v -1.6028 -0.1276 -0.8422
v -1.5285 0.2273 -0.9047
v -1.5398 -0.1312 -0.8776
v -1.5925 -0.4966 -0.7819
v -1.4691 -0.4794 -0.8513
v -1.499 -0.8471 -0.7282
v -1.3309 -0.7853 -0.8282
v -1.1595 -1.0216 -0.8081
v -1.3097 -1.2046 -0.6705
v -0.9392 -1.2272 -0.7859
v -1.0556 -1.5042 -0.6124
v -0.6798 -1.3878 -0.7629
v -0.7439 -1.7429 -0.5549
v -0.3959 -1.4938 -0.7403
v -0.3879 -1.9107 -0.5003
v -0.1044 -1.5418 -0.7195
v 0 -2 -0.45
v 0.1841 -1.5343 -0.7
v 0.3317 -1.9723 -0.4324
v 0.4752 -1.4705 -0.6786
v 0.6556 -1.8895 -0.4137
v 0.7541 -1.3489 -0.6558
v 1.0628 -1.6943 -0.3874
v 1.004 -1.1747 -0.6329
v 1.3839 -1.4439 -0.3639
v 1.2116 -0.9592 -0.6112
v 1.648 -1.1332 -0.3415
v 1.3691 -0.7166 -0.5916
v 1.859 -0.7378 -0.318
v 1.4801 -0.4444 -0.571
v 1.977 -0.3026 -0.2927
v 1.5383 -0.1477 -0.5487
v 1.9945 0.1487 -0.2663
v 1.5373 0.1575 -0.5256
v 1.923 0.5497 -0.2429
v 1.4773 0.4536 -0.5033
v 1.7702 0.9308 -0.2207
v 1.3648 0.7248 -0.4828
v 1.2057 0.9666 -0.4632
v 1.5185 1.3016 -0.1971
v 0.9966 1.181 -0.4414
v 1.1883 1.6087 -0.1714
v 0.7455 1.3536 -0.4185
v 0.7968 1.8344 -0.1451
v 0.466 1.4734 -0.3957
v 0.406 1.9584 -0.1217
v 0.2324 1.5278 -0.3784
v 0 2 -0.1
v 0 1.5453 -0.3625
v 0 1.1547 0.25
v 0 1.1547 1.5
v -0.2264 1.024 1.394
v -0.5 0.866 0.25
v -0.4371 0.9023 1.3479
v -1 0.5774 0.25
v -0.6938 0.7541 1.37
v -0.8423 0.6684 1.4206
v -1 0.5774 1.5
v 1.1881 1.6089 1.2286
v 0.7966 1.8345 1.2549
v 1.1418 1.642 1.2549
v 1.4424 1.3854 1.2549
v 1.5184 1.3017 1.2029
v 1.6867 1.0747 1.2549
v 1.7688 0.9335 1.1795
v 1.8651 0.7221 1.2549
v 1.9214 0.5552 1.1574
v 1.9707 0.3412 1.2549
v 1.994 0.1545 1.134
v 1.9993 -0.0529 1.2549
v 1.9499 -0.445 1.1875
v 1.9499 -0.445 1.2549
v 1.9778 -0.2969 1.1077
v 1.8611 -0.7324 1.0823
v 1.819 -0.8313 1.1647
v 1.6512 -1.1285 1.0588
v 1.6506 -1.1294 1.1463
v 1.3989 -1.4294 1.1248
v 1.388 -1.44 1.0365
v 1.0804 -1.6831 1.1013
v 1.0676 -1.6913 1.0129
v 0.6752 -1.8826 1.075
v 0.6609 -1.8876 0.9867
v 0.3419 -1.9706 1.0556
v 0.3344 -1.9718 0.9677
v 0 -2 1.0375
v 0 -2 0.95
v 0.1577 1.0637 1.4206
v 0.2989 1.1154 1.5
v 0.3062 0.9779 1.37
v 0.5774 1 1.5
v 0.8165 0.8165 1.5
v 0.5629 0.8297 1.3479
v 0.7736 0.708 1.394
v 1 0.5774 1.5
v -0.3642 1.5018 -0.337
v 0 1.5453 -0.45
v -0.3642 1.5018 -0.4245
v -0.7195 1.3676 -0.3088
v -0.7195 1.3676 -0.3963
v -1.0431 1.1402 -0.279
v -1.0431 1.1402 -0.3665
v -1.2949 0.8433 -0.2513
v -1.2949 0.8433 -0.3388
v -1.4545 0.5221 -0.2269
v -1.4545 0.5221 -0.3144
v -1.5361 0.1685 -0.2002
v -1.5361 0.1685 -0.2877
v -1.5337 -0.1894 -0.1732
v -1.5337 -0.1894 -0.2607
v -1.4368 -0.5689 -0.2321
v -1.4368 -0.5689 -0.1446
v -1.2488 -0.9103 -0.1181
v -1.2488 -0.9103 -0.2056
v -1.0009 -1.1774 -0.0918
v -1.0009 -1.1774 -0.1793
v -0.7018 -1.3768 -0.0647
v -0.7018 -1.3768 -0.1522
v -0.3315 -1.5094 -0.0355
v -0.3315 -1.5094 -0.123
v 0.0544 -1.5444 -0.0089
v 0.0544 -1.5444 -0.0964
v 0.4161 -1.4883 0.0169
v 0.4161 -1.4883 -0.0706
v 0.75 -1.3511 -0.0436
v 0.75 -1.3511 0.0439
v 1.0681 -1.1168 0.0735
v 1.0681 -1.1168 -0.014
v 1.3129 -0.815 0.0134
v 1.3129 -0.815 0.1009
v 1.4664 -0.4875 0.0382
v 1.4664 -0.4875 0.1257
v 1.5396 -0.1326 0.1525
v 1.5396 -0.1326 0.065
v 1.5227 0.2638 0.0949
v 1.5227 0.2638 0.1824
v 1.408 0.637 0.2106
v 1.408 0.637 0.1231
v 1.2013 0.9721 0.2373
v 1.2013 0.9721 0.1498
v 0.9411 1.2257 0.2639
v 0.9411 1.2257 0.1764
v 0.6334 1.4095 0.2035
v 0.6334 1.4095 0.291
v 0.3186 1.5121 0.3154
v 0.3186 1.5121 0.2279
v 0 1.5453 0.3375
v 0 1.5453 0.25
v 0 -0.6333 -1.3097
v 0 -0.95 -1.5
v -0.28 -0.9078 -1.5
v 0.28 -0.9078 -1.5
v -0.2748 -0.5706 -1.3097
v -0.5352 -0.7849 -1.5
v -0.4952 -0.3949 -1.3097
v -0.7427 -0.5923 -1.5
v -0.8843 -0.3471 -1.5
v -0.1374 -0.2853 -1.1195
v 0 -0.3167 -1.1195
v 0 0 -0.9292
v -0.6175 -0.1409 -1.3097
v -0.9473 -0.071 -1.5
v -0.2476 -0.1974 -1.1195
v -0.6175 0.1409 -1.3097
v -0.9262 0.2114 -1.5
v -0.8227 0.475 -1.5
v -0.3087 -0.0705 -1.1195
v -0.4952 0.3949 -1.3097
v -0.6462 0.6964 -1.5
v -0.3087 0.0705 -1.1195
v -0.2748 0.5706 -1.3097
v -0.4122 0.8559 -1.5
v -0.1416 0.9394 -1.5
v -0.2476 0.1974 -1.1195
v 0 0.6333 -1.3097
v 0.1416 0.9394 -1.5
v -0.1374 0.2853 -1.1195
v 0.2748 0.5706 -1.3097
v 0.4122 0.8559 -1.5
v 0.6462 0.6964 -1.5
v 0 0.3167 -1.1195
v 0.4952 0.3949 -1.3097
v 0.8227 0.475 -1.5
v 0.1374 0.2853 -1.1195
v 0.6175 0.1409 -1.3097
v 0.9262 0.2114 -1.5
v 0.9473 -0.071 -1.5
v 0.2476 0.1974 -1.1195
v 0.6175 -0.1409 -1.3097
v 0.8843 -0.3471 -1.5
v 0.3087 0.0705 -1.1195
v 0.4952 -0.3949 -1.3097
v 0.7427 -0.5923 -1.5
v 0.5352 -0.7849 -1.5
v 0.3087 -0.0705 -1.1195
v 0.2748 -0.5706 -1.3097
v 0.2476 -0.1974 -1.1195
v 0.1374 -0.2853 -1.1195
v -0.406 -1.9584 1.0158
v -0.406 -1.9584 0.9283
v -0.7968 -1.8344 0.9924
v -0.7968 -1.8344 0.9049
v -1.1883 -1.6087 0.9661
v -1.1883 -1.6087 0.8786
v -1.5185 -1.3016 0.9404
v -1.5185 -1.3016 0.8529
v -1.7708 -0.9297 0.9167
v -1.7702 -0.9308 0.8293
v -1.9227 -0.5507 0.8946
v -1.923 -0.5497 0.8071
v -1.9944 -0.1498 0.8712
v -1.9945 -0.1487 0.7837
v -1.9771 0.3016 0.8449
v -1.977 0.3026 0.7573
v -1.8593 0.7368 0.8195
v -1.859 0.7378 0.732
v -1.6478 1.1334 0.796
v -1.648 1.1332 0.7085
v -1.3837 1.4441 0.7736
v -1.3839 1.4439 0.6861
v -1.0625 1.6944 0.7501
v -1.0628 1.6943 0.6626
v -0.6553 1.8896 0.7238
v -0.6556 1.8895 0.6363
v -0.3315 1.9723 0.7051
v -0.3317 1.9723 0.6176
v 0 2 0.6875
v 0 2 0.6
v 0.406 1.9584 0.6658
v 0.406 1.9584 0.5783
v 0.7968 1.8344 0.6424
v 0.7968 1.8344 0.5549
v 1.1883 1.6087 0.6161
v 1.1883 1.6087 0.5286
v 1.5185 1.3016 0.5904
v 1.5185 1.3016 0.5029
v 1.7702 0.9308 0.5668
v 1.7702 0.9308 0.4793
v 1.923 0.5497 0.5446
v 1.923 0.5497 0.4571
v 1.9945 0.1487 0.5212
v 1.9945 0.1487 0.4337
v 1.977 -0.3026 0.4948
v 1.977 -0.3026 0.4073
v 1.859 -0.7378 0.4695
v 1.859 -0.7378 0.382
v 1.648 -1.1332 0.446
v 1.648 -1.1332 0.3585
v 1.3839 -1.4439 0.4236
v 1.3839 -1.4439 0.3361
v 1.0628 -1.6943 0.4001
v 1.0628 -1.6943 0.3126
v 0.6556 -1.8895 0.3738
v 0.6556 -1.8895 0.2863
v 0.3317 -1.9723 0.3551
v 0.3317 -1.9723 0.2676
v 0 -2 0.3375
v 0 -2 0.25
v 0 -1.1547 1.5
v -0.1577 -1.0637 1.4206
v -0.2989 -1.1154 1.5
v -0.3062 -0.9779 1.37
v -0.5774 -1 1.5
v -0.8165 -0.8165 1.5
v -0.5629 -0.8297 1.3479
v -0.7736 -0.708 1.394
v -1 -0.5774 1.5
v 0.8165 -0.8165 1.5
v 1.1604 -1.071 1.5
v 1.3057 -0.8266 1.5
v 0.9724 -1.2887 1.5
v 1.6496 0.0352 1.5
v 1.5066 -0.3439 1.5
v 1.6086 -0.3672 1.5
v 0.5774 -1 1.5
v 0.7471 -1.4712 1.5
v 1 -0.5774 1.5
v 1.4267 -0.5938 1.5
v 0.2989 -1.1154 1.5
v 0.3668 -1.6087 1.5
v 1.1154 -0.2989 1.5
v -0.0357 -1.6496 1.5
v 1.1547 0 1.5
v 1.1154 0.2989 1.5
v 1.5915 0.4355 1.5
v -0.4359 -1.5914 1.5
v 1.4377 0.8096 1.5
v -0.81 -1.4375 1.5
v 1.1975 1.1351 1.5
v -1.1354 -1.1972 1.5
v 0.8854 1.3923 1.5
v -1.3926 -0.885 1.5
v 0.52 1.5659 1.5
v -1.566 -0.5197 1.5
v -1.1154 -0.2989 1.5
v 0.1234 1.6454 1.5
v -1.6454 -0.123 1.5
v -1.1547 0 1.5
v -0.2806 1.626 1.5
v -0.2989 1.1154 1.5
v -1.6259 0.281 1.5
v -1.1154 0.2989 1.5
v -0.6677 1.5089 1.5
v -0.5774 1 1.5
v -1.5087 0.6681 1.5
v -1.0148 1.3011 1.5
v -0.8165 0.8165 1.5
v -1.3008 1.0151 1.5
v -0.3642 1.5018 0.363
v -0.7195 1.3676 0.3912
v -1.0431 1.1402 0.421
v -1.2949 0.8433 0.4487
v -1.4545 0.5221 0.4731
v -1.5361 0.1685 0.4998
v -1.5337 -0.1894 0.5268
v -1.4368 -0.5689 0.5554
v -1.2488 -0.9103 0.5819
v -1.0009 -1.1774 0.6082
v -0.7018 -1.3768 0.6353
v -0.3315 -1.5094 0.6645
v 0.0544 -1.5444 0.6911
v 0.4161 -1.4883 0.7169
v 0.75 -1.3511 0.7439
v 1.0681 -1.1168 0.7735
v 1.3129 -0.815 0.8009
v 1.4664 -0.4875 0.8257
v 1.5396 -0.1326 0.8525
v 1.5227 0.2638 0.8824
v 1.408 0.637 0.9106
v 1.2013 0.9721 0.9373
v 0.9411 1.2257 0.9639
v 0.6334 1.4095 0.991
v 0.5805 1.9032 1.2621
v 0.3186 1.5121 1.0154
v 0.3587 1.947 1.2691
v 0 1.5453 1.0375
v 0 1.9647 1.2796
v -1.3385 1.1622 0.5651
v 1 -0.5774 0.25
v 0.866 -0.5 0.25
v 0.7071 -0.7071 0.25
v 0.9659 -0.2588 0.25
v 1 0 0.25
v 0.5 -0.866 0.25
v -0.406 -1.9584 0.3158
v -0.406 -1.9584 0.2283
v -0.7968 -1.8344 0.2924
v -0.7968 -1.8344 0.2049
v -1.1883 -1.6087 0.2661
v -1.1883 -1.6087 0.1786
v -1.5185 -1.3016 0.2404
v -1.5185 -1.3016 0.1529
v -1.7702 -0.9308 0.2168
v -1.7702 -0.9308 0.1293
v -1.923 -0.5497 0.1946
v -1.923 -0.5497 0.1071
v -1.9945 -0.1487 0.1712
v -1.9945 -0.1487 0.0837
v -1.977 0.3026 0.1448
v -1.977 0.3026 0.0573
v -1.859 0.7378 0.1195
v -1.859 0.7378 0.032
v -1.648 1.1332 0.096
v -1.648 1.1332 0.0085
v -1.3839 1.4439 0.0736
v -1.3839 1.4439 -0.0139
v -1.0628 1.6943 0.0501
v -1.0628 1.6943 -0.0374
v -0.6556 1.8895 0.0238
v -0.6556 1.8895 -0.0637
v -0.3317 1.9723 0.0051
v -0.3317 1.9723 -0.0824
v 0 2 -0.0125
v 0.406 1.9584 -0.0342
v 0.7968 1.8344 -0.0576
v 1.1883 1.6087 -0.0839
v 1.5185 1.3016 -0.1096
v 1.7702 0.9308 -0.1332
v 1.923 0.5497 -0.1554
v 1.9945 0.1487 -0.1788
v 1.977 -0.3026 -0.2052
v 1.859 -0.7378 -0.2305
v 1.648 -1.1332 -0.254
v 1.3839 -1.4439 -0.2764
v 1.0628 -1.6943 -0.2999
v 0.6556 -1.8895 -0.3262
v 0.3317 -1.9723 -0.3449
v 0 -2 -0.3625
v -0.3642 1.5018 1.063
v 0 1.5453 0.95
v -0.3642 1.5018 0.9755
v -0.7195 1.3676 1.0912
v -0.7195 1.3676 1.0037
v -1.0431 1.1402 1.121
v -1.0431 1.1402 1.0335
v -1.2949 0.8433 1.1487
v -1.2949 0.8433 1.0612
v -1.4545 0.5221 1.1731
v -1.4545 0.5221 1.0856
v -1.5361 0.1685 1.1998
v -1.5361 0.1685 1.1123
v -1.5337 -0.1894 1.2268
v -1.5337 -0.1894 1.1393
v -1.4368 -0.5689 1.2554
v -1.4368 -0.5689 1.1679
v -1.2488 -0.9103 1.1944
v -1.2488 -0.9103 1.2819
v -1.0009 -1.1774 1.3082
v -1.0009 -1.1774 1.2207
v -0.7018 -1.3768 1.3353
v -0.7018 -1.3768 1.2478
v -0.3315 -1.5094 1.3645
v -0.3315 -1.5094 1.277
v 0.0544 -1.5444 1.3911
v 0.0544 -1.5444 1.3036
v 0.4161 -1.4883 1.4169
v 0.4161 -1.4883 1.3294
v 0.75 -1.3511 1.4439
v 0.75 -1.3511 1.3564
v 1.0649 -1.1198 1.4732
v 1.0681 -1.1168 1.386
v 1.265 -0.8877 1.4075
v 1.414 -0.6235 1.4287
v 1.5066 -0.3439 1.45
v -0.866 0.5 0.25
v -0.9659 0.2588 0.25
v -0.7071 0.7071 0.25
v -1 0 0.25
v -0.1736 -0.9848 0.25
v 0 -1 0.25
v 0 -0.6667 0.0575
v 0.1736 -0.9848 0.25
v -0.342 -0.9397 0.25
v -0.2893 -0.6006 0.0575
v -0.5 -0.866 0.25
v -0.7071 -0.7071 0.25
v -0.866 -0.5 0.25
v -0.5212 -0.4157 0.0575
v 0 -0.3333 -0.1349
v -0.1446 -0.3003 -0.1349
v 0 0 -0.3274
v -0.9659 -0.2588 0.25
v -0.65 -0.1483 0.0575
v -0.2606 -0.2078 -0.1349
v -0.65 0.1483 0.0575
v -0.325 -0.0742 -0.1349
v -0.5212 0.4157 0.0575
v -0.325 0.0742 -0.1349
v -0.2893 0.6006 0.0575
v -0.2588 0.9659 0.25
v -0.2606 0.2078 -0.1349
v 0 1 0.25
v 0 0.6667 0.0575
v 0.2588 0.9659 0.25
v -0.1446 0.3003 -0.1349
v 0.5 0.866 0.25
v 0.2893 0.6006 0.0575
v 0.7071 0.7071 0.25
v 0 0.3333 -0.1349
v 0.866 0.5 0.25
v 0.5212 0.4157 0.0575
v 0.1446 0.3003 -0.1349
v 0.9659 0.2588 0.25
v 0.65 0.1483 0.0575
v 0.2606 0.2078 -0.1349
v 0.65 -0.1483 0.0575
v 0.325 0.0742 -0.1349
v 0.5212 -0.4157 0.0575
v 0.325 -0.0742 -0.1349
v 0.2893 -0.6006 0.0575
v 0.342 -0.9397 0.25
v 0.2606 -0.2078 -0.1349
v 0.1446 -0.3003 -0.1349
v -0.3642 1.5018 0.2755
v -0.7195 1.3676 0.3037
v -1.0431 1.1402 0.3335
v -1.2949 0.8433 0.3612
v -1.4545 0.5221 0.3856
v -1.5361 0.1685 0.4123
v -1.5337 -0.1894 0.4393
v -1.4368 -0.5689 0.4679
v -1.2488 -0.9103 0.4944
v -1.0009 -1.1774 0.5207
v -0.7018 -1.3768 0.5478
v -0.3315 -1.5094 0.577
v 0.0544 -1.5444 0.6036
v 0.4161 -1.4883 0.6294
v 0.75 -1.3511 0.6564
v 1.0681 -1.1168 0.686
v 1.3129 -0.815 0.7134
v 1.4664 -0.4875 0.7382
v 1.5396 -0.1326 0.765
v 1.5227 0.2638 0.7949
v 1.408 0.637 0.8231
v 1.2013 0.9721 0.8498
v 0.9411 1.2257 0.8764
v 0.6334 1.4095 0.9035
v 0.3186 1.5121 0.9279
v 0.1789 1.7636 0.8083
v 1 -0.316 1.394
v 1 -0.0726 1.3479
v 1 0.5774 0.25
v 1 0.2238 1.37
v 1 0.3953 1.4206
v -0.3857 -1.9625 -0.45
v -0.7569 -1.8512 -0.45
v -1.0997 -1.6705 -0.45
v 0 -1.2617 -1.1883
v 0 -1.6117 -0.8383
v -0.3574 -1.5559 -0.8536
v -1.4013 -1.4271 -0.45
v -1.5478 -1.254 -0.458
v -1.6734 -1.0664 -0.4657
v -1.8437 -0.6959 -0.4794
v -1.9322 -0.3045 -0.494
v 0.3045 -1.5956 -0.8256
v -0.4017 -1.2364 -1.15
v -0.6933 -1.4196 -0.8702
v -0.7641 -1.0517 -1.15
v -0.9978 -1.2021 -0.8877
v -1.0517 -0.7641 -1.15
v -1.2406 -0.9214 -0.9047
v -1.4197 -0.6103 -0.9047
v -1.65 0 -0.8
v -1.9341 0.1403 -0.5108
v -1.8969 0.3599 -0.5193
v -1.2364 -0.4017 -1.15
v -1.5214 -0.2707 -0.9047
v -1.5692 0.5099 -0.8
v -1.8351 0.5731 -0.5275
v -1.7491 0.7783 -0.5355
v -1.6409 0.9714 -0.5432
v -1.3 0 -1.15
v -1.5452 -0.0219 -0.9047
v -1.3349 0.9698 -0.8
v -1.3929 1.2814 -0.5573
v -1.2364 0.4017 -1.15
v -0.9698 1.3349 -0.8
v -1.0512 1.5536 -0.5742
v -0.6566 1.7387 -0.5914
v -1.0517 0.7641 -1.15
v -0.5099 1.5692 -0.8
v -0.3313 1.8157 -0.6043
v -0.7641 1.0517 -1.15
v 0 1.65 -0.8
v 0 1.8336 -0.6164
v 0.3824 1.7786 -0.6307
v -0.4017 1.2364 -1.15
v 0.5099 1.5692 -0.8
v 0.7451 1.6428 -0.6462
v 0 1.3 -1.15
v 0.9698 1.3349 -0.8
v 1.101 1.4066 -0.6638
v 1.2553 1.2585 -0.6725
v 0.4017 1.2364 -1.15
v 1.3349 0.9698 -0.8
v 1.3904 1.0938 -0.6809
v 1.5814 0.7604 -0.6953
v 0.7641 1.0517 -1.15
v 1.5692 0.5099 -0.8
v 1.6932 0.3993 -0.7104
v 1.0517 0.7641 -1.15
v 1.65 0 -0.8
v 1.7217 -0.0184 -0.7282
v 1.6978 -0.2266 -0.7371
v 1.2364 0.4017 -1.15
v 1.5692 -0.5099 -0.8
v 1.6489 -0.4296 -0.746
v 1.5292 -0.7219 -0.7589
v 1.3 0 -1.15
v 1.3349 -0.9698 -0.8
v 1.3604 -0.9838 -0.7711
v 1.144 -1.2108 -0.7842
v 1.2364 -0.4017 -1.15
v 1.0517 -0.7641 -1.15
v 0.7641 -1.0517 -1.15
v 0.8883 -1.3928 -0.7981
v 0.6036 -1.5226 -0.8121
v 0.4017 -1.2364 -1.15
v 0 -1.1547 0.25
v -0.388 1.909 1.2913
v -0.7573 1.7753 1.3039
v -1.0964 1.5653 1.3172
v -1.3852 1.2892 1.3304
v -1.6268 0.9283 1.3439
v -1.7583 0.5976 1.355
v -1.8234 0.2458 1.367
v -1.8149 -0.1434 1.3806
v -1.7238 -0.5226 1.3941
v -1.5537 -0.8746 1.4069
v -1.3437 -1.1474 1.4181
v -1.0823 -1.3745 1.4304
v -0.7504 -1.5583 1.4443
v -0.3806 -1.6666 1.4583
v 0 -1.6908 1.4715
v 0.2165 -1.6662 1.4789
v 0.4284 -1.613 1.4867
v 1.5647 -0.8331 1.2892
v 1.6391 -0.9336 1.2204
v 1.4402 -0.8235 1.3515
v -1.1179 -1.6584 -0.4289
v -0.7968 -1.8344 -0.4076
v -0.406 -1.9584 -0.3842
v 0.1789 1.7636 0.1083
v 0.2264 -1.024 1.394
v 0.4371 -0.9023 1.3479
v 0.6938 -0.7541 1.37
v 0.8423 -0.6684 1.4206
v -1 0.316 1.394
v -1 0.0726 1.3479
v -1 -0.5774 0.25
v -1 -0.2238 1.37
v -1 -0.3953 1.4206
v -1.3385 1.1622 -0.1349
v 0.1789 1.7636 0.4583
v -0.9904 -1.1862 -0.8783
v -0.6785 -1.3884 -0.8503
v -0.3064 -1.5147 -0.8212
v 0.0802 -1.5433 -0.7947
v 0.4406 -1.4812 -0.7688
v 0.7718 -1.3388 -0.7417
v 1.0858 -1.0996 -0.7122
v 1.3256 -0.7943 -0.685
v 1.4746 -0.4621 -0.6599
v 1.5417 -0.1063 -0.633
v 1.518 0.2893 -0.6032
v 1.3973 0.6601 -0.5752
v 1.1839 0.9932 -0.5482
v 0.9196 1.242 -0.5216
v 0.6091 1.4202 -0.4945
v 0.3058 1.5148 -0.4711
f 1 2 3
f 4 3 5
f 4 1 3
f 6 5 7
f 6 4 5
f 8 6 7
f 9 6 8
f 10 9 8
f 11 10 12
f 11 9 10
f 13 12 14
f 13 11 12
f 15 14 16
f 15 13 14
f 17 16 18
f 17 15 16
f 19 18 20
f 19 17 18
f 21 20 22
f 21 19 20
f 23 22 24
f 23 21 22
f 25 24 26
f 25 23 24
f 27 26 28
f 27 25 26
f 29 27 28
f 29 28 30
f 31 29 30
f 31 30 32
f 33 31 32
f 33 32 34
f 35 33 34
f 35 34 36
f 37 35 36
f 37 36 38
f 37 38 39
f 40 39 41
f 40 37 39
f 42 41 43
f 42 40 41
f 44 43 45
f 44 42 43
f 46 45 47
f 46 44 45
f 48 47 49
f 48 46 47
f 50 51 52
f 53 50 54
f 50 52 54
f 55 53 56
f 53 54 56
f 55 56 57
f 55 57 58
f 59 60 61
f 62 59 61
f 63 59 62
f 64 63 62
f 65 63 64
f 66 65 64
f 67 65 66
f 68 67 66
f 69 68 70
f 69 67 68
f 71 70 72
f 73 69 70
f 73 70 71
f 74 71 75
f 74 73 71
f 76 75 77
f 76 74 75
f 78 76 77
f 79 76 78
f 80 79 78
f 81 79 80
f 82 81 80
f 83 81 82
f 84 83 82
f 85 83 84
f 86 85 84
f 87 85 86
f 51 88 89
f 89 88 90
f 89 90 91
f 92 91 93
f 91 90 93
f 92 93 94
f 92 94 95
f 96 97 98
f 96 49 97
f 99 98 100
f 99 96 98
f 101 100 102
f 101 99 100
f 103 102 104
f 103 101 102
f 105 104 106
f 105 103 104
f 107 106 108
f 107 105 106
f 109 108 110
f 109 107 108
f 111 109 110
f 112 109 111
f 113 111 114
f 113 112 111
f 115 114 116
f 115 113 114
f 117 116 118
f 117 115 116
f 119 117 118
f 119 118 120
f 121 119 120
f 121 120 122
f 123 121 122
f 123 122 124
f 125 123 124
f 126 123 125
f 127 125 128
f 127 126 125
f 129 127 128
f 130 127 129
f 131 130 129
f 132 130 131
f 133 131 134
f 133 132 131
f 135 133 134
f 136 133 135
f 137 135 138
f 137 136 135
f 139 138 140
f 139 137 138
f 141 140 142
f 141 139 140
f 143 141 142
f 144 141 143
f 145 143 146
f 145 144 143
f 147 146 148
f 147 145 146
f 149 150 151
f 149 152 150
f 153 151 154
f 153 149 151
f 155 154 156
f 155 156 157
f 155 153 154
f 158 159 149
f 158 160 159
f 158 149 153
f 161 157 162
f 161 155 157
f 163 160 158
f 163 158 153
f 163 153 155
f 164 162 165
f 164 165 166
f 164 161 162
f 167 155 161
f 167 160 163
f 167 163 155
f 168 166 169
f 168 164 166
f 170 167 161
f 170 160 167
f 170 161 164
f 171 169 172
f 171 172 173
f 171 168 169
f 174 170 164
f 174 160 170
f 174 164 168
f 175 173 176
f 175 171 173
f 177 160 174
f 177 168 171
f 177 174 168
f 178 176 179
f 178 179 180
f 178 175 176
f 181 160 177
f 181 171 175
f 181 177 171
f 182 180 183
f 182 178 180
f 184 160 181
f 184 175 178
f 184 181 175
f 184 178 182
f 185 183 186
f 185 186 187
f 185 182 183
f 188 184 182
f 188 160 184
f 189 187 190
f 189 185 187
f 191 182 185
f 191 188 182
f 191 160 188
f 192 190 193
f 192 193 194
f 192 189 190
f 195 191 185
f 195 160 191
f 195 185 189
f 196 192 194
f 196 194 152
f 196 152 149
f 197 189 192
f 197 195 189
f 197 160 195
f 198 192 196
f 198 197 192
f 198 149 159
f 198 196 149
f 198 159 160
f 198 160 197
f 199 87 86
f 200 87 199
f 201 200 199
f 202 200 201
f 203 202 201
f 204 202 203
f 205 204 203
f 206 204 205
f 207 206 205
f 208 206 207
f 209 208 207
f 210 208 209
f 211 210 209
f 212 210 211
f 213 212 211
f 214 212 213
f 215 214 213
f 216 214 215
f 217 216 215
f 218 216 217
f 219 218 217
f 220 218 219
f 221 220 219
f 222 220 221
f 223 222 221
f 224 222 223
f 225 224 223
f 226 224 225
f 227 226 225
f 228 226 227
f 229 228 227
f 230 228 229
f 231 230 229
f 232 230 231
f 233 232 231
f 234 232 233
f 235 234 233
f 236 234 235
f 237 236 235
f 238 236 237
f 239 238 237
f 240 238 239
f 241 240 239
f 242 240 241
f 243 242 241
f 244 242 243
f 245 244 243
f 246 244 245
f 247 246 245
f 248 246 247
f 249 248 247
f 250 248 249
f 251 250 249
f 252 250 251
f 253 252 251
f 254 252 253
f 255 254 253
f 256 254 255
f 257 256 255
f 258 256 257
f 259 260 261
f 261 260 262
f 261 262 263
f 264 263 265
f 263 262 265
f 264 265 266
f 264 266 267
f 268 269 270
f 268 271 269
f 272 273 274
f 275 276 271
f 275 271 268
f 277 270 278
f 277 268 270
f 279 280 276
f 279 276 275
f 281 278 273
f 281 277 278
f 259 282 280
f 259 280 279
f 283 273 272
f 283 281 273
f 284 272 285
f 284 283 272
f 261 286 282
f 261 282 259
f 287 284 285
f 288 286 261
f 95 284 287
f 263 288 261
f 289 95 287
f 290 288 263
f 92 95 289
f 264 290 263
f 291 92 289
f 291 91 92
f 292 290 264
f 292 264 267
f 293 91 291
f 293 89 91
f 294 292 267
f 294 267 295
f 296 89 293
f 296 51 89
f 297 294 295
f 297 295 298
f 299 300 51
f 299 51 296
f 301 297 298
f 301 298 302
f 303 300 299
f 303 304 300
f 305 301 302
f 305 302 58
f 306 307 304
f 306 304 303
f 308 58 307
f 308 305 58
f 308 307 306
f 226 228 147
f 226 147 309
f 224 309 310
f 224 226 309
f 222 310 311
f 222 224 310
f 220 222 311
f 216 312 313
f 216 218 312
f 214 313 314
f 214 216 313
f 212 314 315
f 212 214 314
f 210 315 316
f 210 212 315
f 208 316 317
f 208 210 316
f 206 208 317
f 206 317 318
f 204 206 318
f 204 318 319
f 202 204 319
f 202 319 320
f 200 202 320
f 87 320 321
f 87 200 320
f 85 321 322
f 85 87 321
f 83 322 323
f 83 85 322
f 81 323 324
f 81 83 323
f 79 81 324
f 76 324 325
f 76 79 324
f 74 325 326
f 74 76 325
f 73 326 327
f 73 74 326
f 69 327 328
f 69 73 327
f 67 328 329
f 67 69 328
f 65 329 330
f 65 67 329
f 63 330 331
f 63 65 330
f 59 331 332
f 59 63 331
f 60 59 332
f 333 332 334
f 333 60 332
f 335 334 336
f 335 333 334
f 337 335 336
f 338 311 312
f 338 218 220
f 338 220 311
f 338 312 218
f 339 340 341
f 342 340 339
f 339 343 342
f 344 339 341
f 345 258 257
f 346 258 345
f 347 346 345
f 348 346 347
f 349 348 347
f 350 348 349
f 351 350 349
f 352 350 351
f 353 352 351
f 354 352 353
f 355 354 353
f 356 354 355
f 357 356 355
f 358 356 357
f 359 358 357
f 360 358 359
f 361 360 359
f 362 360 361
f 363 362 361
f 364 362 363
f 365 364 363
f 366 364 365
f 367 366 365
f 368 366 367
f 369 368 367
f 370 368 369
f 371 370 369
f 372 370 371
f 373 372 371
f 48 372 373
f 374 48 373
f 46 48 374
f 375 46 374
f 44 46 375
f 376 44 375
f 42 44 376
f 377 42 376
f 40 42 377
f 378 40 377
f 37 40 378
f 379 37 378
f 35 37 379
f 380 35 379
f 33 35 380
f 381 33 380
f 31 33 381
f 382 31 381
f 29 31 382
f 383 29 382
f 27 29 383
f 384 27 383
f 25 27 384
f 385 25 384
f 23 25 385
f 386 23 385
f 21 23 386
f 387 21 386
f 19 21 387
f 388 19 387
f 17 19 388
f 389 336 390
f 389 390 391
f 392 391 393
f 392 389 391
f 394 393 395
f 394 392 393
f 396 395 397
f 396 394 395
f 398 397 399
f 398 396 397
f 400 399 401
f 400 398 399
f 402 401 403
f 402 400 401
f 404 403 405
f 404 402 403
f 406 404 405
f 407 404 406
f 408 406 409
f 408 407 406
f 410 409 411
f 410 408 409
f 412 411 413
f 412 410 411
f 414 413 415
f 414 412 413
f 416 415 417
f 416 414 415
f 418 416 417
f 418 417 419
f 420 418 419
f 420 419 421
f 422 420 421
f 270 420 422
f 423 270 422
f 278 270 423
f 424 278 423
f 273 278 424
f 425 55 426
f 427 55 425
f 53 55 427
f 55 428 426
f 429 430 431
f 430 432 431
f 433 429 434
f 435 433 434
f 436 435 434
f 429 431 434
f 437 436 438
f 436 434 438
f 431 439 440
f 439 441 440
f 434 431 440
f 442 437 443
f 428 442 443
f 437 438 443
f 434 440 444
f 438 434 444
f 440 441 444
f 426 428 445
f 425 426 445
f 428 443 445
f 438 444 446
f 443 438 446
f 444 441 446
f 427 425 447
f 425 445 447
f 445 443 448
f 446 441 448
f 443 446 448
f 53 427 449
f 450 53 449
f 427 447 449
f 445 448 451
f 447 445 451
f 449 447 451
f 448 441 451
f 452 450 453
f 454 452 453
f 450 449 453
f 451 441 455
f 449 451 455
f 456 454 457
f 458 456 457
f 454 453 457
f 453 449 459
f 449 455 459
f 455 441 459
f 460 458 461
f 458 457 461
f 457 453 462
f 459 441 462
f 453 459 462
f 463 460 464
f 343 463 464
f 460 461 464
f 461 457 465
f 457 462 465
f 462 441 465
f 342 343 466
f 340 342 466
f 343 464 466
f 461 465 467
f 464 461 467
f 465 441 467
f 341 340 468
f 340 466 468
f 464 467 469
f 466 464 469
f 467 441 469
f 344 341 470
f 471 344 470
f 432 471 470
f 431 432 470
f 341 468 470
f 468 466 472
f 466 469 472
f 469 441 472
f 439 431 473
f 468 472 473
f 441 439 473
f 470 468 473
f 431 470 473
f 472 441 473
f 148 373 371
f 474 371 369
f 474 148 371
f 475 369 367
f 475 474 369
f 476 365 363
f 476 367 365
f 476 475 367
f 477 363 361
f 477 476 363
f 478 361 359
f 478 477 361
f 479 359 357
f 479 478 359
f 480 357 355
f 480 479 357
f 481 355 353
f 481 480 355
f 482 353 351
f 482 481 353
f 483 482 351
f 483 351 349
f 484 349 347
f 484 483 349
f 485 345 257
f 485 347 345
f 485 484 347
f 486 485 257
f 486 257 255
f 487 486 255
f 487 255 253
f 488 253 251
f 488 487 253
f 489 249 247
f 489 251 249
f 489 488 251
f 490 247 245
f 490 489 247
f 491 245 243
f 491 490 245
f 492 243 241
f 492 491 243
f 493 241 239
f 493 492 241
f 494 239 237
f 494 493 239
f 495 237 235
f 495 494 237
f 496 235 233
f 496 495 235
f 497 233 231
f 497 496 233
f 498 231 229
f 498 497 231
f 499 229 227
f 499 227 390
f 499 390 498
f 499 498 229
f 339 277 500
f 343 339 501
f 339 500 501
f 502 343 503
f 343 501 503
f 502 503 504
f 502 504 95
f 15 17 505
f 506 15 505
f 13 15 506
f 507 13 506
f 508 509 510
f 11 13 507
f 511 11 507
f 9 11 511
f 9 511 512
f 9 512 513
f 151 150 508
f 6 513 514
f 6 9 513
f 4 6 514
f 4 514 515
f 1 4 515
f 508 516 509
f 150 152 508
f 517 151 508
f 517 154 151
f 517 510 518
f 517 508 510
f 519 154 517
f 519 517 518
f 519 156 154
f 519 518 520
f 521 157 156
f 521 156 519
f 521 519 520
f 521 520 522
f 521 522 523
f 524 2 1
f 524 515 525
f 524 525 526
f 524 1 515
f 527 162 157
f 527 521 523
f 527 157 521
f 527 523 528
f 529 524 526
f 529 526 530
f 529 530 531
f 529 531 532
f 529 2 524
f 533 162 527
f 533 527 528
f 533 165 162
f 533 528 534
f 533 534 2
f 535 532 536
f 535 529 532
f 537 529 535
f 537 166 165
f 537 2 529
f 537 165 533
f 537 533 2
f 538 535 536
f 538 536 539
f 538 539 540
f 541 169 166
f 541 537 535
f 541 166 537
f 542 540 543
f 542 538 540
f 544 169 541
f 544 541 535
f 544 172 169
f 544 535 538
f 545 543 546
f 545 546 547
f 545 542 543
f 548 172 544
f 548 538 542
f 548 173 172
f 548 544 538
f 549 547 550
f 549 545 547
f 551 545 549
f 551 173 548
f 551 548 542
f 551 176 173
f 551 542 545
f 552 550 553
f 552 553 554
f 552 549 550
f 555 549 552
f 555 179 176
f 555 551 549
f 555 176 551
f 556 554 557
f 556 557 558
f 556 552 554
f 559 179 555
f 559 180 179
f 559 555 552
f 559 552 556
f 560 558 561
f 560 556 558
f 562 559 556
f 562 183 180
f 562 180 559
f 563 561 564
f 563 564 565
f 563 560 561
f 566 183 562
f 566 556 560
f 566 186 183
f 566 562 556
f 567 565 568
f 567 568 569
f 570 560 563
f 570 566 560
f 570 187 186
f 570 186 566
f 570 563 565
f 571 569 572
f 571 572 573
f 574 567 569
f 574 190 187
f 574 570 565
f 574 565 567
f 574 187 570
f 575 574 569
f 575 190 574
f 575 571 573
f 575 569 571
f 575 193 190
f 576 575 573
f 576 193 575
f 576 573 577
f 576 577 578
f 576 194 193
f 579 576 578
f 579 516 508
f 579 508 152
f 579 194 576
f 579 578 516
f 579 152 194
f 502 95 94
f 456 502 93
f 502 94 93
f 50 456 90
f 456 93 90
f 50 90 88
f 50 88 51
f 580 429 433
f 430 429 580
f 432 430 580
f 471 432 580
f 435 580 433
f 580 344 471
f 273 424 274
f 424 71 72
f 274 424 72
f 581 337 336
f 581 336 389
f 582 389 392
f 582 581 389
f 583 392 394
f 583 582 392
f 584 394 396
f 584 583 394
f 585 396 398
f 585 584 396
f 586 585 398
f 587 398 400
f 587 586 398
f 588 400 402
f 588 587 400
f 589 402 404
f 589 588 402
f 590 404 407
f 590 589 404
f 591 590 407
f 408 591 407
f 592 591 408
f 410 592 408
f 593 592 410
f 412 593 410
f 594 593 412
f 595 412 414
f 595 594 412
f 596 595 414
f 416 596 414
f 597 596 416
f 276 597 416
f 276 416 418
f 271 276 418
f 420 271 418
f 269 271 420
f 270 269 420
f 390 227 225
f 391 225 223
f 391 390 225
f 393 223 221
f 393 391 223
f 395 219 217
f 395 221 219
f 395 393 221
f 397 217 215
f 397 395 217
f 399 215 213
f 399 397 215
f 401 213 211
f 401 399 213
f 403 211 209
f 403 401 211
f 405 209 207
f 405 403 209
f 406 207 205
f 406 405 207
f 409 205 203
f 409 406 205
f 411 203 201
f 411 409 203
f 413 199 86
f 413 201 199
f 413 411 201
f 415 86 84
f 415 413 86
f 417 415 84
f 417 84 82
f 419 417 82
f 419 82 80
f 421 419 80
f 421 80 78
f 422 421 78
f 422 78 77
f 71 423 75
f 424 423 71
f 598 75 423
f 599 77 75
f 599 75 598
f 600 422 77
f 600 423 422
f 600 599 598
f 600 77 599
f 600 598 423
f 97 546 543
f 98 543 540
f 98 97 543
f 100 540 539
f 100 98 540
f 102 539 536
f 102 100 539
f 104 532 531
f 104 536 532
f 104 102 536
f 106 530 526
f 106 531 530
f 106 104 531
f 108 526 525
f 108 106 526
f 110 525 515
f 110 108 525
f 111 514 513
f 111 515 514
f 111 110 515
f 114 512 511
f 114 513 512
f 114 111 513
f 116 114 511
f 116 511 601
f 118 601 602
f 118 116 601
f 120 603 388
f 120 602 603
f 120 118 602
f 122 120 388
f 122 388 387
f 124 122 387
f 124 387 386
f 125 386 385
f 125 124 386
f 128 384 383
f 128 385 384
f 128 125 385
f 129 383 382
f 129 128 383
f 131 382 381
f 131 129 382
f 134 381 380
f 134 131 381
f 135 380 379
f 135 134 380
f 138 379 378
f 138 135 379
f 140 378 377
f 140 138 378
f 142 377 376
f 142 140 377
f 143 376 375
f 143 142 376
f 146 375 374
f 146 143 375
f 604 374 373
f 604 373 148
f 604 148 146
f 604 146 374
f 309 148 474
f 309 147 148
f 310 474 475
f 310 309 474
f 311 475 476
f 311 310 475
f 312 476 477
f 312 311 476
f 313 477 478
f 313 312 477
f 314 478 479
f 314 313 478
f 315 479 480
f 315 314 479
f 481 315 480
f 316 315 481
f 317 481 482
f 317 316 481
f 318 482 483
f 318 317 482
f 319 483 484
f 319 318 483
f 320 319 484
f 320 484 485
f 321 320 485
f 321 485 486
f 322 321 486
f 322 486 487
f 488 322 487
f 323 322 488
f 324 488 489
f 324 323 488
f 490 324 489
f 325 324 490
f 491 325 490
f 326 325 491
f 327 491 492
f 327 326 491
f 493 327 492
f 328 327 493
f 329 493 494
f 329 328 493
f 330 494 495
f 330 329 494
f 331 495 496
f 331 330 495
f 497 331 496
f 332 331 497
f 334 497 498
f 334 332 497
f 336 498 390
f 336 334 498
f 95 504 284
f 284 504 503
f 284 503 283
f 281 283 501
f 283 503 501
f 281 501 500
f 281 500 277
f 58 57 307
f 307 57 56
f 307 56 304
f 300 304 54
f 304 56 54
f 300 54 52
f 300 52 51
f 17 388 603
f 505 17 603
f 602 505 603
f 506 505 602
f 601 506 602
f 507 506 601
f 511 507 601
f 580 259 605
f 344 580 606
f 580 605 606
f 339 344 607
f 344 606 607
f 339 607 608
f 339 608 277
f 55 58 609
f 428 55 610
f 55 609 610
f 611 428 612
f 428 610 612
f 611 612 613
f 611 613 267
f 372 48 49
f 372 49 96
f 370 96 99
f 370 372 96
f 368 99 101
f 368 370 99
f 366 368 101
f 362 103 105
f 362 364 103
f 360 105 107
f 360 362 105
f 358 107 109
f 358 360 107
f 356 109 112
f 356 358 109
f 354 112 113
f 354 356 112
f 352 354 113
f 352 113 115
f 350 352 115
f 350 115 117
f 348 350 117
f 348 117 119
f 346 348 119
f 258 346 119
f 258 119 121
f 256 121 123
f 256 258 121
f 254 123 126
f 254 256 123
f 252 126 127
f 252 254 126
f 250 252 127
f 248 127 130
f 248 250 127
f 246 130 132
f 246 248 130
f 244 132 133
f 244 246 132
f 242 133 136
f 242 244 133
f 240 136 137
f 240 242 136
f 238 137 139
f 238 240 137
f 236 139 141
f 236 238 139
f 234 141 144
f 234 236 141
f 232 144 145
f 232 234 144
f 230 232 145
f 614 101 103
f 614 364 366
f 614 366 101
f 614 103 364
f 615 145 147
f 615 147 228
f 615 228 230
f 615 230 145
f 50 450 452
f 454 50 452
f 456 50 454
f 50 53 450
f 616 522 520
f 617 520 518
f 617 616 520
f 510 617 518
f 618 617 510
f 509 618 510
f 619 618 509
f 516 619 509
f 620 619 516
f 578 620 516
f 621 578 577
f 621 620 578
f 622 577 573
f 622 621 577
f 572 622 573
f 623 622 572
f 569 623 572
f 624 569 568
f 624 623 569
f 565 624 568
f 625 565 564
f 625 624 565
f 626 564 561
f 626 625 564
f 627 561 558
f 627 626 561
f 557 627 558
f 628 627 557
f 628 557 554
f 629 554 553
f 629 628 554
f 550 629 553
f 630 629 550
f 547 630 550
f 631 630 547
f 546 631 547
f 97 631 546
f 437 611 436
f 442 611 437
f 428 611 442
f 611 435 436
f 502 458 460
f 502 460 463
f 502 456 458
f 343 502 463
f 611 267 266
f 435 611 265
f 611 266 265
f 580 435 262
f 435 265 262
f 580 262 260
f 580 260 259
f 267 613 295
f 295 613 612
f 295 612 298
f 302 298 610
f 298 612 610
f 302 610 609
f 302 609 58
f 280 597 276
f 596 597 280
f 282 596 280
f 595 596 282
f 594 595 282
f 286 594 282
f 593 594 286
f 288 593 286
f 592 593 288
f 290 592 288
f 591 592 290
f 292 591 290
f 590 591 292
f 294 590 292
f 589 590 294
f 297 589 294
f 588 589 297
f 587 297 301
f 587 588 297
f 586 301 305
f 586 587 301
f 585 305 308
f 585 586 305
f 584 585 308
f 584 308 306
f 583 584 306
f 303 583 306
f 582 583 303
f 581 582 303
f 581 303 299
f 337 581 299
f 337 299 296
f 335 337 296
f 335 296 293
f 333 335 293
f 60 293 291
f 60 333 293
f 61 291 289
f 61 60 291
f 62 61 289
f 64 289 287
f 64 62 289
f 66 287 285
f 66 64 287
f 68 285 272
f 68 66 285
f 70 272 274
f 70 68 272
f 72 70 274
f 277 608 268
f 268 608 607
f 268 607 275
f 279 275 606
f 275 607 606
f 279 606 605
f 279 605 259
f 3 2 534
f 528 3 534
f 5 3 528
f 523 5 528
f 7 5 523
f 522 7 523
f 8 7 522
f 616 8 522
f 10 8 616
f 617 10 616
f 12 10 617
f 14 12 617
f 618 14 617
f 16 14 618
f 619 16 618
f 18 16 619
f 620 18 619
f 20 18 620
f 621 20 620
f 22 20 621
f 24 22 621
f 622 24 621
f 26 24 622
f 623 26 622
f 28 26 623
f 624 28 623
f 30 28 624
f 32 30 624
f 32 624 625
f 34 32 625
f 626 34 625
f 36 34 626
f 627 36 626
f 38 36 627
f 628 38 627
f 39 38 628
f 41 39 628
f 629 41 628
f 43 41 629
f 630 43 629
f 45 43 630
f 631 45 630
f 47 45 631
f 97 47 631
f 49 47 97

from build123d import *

# Parameters (mm, degrees)
CUT_EXTRUDE1_DEPTH = 1.25
CUT_SWEEP1_PITCH   = 0.7


with BuildPart() as part:
    # Sketch11 → Revolve1 (revolve)
    with BuildSketch(Plane(origin=(0, 0, 0), x_dir=(0, 0, -1), z_dir=(1, 0, 0)), mode=Mode.PRIVATE) as revolve1_sk:
        Polygon((-1.5, 0), (-1.5, 1.65), (-1.254927362, 2), (0.45, 2), (1.5, 0.95), (0.929182412, 0), align=None)
    revolve(revolve1_sk.sketch.rotate(Axis((0, 0, -0.929182412), (0, 0, -1)), 180), axis=Axis((0, 0, -0.929182412), (0, 0, -1)))

    # Sketch2 → Cut-Extrude1 (cut)
    with BuildSketch(Plane.XY.offset(1.5)):
        Polygon((0, 1.154700538), (-1, 0.577350269), (-1, -0.577350269), (0, -1.154700538), (1, -0.577350269), (1, 0.577350269), align=None)
    extrude(amount=-CUT_EXTRUDE1_DEPTH, mode=Mode.SUBTRACT)

    # Cut-Extrude2 cone 1 section (through the dimple's axis) → Cut-Extrude2 (revolve, cut)
    with BuildSketch(Plane(origin=(0, 0, 1.5), x_dir=(0, -1, 0), z_dir=(1, 0, 0))):
        Polygon((0, 0), (1.154700538, 0), (0, 1.154700538), align=None)
    revolve(axis=Axis((0, 0, 1.5), (0, 0, -1)), mode=Mode.SUBTRACT)

    # Cut-Extrude3 cone 1 section (through the dimple's axis) → Cut-Extrude3 (revolve, cut)
    with BuildSketch(Plane(origin=(0, 0, 0.25), x_dir=(0, -1, 0), z_dir=(1, 0, 0))):
        Polygon((0, 0), (1, 0), (0, 0.577350269), align=None)
    revolve(axis=Axis((0, 0, 0.25), (0, 0, -1)), mode=Mode.SUBTRACT)

    # Cut-Sweep1: the profile of Sketch6 screwed along a right-hand helix of 4.714286 turns, 6 arcs to a turn; built about Z, then put on its axis
    cut_sweep1_z = Axis((0, 0, 0), (0, 0, 1))
    cut_sweep1_corners = [(2.037888611, 0, 0.021875), (2.037888611, 0, -0.634375), (1.545336663, 0, -0.35), (1.545336663, 0, -0.2625)]
    with BuildLine(mode=Mode.PRIVATE) as cut_sweep1_profile:
        Line(cut_sweep1_corners[0], cut_sweep1_corners[1])
        Line(cut_sweep1_corners[1], cut_sweep1_corners[2])
        Line(cut_sweep1_corners[2], cut_sweep1_corners[3])
        Line(cut_sweep1_corners[3], cut_sweep1_corners[0])
    cut_sweep1_cap = Face(cut_sweep1_profile.wire())
    cut_sweep1_turn_angles = [0, 30, 60, 90, 120, 150, 180, 210, 240, 270, 300, 330, 360]
    cut_sweep1_turn_weights = [1, 0.8660254037844387, 1, 0.8660254037844387, 1, 0.8660254037844387, 1, 0.8660254037844387, 1, 0.8660254037844387, 1, 0.8660254037844387, 1]
    cut_sweep1_turn_rails = [Edge.make_bspline([Vector(p[0], p[1], 0).rotate(cut_sweep1_z, cut_sweep1_turn_angles[k]) / cut_sweep1_turn_weights[k] + Vector(0, 0, p[2] + CUT_SWEEP1_PITCH * cut_sweep1_turn_angles[k] / 360) for k in range(13)], [0, 0, 0, 1, 1, 2, 2, 3, 3, 4, 4, 5, 5, 6, 6, 6], 2, cut_sweep1_turn_weights) for p in cut_sweep1_corners]
    cut_sweep1_turn_sides = [Face.make_surface_from_curves(cut_sweep1_turn_rails[p[0]], cut_sweep1_turn_rails[p[1]]) for p in [(0, 1), (1, 2), (2, 3), (3, 0)]]
    cut_sweep1_last_angles = [1440, 1470, 1500, 1530, 1560, 1590, 1620, 1650, 1680, 1688.571428571, 1697.142857143]
    cut_sweep1_last_weights = [1, 0.8660254037844387, 1, 0.8660254037844387, 1, 0.8660254037844387, 1, 0.8660254037844387, 1, 0.9888308262251233, 1]
    cut_sweep1_last_rails = [Edge.make_bspline([Vector(p[0], p[1], 0).rotate(cut_sweep1_z, cut_sweep1_last_angles[k]) / cut_sweep1_last_weights[k] + Vector(0, 0, p[2] + CUT_SWEEP1_PITCH * cut_sweep1_last_angles[k] / 360) for k in range(11)], [0, 0, 0, 1, 1, 2, 2, 3, 3, 4, 4, 5, 5, 5], 2, cut_sweep1_last_weights) for p in cut_sweep1_corners]
    cut_sweep1_last_sides = [Face.make_surface_from_curves(cut_sweep1_last_rails[p[0]], cut_sweep1_last_rails[p[1]]) for p in [(0, 1), (1, 2), (2, 3), (3, 0)]]
    cut_sweep1 = Plane(origin=(0, 0, -1.5), x_dir=(0, 1, 0), z_dir=(0, 0, 1)) * Solid(Shell([*[p.moved(Location((0, 0, CUT_SWEEP1_PITCH * i))) for i in range(4) for p in cut_sweep1_turn_sides], *cut_sweep1_last_sides, cut_sweep1_cap, cut_sweep1_cap.rotate(cut_sweep1_z, 1697.142857143).moved(Location((0, 0, CUT_SWEEP1_PITCH * 1697.142857143 / 360)))]))
    add(cut_sweep1, mode=Mode.SUBTRACT)


solid = part.part
